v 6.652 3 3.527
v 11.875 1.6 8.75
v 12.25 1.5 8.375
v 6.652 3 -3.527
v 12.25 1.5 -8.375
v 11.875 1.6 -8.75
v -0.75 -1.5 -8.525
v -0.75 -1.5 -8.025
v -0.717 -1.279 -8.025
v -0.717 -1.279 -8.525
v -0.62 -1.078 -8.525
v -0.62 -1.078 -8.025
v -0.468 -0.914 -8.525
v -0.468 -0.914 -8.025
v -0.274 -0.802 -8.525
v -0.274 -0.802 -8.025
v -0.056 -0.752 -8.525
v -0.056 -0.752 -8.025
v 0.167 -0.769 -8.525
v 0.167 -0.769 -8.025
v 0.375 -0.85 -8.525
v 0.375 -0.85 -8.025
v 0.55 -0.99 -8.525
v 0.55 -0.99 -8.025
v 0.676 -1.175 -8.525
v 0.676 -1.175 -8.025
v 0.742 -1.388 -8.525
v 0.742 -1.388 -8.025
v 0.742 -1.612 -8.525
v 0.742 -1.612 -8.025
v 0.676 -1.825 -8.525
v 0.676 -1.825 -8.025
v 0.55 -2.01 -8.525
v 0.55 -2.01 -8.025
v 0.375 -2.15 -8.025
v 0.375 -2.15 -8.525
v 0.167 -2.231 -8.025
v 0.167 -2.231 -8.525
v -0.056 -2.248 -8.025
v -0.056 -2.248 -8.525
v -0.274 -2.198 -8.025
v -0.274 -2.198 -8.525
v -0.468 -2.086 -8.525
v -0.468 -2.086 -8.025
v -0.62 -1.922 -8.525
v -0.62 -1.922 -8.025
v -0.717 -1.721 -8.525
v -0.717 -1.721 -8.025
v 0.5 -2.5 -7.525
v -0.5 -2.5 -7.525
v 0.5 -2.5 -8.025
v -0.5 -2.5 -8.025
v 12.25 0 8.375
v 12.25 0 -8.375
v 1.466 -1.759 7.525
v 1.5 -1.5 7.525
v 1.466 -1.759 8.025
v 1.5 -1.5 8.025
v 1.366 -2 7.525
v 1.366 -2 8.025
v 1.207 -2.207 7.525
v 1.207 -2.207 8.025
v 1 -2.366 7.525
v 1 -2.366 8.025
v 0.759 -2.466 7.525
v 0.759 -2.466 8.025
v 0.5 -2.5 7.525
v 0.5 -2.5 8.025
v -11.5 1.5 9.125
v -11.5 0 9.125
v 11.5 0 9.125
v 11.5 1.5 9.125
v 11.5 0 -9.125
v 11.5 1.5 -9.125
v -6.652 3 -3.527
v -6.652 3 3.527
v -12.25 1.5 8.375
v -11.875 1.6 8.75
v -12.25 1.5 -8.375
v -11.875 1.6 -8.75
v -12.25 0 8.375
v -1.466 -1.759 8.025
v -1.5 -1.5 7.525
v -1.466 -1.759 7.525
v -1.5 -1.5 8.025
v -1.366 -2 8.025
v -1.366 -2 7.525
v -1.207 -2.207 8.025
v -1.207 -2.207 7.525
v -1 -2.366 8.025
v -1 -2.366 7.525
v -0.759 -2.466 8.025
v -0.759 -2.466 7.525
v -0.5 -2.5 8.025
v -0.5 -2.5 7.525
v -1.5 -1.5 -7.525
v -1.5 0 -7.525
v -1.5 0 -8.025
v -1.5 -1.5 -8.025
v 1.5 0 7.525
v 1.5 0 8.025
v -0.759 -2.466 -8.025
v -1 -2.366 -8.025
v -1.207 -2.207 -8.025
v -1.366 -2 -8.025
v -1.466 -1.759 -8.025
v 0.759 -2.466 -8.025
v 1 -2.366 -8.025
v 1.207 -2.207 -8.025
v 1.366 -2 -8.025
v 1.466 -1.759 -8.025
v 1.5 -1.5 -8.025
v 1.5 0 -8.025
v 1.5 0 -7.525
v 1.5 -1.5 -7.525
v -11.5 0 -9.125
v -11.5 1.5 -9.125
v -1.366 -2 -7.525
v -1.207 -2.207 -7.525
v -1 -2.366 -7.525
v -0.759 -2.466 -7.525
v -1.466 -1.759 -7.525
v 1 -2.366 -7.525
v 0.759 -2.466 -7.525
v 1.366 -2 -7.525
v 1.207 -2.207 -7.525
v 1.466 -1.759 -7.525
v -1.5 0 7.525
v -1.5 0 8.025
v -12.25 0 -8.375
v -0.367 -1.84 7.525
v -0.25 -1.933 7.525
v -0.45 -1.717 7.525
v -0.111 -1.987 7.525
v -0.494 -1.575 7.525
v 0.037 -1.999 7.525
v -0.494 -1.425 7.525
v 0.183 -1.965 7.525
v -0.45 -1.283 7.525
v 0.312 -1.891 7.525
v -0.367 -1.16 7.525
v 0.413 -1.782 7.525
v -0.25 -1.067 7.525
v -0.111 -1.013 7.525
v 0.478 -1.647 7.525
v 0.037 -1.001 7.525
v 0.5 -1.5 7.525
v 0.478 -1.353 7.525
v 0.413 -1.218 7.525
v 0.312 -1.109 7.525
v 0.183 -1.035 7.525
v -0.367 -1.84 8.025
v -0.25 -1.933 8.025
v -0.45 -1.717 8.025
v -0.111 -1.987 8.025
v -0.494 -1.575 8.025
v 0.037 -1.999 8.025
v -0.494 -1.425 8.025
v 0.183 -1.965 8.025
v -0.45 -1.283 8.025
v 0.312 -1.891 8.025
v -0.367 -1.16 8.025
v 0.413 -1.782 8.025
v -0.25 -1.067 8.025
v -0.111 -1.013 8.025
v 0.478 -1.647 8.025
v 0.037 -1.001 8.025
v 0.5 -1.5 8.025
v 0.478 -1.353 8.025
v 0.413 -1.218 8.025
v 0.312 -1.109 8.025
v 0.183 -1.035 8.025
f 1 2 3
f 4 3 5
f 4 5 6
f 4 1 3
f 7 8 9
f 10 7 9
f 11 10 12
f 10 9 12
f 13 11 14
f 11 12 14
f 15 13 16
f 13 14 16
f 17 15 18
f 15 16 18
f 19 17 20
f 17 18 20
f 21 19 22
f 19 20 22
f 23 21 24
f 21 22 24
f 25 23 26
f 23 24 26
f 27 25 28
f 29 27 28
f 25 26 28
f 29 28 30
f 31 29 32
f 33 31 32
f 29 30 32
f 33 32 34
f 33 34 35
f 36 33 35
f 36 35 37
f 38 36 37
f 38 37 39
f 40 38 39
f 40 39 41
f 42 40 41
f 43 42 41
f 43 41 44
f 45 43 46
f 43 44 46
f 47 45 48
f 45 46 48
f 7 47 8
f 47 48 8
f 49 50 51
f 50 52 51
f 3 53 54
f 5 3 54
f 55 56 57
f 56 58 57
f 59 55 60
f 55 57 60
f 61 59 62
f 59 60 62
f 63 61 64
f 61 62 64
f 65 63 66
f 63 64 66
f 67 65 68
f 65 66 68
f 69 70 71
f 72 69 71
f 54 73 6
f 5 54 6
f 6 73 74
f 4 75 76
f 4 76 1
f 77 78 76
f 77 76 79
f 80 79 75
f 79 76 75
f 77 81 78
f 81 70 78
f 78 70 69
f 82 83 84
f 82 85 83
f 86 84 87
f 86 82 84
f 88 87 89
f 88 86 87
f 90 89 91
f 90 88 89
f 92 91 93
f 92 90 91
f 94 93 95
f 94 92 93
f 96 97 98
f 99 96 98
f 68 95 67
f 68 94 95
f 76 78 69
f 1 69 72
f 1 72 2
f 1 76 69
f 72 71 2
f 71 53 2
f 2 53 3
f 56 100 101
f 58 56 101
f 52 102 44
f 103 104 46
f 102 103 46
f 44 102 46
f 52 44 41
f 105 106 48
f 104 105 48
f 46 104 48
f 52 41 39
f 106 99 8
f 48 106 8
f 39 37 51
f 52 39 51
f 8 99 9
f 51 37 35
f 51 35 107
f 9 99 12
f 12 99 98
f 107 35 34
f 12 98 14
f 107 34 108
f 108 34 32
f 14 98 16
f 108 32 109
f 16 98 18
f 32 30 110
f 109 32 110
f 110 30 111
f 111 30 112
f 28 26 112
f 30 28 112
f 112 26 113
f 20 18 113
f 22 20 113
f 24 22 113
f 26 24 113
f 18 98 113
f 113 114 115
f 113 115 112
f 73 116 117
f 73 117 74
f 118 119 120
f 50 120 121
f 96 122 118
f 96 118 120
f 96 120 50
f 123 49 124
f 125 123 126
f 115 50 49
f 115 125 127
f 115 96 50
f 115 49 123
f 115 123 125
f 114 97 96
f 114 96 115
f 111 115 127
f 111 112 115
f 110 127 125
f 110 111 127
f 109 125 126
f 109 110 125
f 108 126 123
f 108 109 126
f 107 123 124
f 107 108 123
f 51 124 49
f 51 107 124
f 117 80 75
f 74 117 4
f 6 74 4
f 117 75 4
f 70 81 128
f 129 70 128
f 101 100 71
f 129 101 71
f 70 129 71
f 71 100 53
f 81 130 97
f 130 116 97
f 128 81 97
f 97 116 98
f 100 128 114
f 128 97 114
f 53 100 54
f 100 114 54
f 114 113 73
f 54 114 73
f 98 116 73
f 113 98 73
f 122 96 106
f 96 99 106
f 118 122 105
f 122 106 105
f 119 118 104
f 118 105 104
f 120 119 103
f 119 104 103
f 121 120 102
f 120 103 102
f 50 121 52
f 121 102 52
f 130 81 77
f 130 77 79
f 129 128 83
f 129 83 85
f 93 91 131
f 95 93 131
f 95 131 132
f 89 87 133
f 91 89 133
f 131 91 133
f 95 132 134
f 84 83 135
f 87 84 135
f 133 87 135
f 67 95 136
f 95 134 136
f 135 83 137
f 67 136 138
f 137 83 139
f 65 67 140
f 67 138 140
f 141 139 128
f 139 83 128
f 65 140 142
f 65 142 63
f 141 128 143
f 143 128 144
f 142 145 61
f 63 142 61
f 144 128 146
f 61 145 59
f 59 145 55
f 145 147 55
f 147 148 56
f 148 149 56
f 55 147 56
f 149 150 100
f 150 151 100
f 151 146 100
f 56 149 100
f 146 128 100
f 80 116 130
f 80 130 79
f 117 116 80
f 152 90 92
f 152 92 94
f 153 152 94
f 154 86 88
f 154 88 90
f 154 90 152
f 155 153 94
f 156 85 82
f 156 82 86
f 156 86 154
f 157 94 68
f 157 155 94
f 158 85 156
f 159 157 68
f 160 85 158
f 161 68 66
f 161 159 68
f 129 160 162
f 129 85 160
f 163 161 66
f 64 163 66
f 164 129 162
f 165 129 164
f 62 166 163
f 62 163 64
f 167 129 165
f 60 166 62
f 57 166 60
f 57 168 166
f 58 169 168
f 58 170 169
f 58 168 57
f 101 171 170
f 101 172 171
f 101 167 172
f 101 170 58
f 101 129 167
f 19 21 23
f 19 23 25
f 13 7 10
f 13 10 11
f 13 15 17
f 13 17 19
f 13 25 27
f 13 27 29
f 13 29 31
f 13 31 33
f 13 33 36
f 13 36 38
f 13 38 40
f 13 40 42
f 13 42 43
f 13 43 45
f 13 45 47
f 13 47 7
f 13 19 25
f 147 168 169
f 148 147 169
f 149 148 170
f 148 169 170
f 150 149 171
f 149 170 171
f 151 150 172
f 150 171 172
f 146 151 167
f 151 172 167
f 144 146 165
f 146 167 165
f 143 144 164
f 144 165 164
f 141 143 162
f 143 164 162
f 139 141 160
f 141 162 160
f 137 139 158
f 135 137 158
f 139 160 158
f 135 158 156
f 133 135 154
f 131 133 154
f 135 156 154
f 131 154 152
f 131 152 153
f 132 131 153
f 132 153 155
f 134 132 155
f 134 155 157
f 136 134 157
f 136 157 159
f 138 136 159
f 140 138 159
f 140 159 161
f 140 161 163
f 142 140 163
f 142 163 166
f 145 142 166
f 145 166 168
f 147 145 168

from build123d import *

# Parameters (mm, degrees)
SKETCH1_W             = 24.5
SKETCH1_H             = 18.25
BOSS_EXTRUDE1_DEPTH   = 3
CHAMFER1_SIZE         = 0.75
CHAMFER2_SIZE         = 1.5
CHAMFER2_SIZE2        = 5.598076211
CHAMFER2_PART_2_SIZE  = 1.5
CHAMFER2_PART_2_SIZE2 = 5.598076211
CHAMFER2_PART_3_SIZE  = 1.5
CHAMFER2_PART_3_SIZE2 = 5.598076211
CHAMFER2_PART_4_SIZE  = 1.5
CHAMFER2_PART_4_SIZE2 = 5.598076211
SKETCH4_W             = 3
SKETCH4_H             = 0.5
BOSS_EXTRUDE2_DEPTH   = 2.5
FILLET2_R             = 1
FILLET2_OF_MIRROR2_R  = 1
SKETCH5_R             = 0.75
BOSS_EXTRUDE3_DEPTH   = 0.5
CUT_EXTRUDE2_REACH    = 23.288
SKETCH6_R             = 0.5


with BuildPart() as part:
    # Sketch1 → Boss-Extrude1 (new body)
    with BuildSketch(Plane(origin=(0, 0, 0), x_dir=(1, 0, 0), z_dir=(0, 1, 0))):
        Rectangle(SKETCH1_W, SKETCH1_H)
    extrude(amount=BOSS_EXTRUDE1_DEPTH)

    # Chamfer1
    chamfer1_edges = [part.edges().sort_by_distance(p)[0] for p in [
        (12.25, 1.5, 9.125),
        (-12.25, 1.5, 9.125),
        (-12.25, 1.5, -9.125),
        (12.25, 1.5, -9.125),
    ]]
    chamfer(chamfer1_edges, length=CHAMFER1_SIZE)

    # Chamfer2
    chamfer2_edges = [part.edges().sort_by_distance(p)[0] for p in [
        (12.25, 3, 0),
    ]]
    chamfer2_side = [part.faces().sort_by_distance(p)[0] for p in [
        (12.25, 1.5, 0),
    ]]
    chamfer(chamfer2_edges, length=CHAMFER2_SIZE, length2=CHAMFER2_SIZE2, reference=chamfer2_side[0])

    # Chamfer2 part 2
    chamfer2_part_2_edges = [part.edges().sort_by_distance(p)[0] for p in [
        (0, 3, 9.125),
    ]]
    chamfer2_part_2_side = [part.faces().sort_by_distance(p)[0] for p in [
        (0, 1.5, 9.125),
    ]]
    chamfer(chamfer2_part_2_edges, length=CHAMFER2_PART_2_SIZE, length2=CHAMFER2_PART_2_SIZE2, reference=chamfer2_part_2_side[0])

    # Chamfer2 part 3
    chamfer2_part_3_edges = [part.edges().sort_by_distance(p)[0] for p in [
        (-12.25, 3, 0),
    ]]
    chamfer2_part_3_side = [part.faces().sort_by_distance(p)[0] for p in [
        (-12.25, 1.5, 0),
    ]]
    chamfer(chamfer2_part_3_edges, length=CHAMFER2_PART_3_SIZE, length2=CHAMFER2_PART_3_SIZE2, reference=chamfer2_part_3_side[0])

    # Chamfer2 part 4
    chamfer2_part_4_edges = [part.edges().sort_by_distance(p)[0] for p in [
        (0, 3, -9.125),
    ]]
    chamfer2_part_4_side = [part.faces().sort_by_distance(p)[0] for p in [
        (0, 1.5, -9.125),
    ]]
    chamfer(chamfer2_part_4_edges, length=CHAMFER2_PART_4_SIZE, length2=CHAMFER2_PART_4_SIZE2, reference=chamfer2_part_4_side[0])

    # Sketch4 → Boss-Extrude2 (add)
    with BuildSketch(Plane.XZ):
        with Locations((0, 7.775)):
            Rectangle(SKETCH4_W, SKETCH4_H)
    boss_extrude2 = extrude(amount=BOSS_EXTRUDE2_DEPTH)

    # Fillet2
    fillet2_edges = [part.edges().sort_by_distance(p)[0] for p in [
        (-1.5, -2.5, 7.775),
        (1.5, -2.5, 7.775),
    ]]
    fillet(fillet2_edges, radius=FILLET2_R)

    # Mirror2: Boss-Extrude2 across plane
    add(boss_extrude2.mirror(Plane.XY))

    # Fillet2 of Mirror2
    fillet2_of_mirror2_edges = [part.edges().sort_by_distance(p)[0] for p in [
        (-1.5, -2.5, -7.775),
        (1.5, -2.5, -7.775),
    ]]
    fillet(fillet2_of_mirror2_edges, radius=FILLET2_OF_MIRROR2_R)

    # Sketch5 → Boss-Extrude3 (add)
    with BuildSketch(Plane(origin=(0, 0, -8.025), x_dir=(-1, 0, 0), z_dir=(0, 0, -1))):
        with Locations((0, -1.5)):
            Circle(SKETCH5_R)
    extrude(amount=BOSS_EXTRUDE3_DEPTH)

    # Sketch6 → Cut-Extrude2 (cut, up to next)
    with BuildSketch(Plane.XY.offset(8.025), mode=Mode.PRIVATE) as cut_extrude2_sk1:
        with Locations((0, -1.5)):
            Circle(SKETCH6_R)
    cut_extrude2_tool1 = extrude(cut_extrude2_sk1.sketch, amount=-CUT_EXTRUDE2_REACH, mode=Mode.PRIVATE) & part.part
    add(cut_extrude2_tool1.solids().sort_by_distance((0, -1.5, 8.025))[0], mode=Mode.SUBTRACT)


solid = part.part
